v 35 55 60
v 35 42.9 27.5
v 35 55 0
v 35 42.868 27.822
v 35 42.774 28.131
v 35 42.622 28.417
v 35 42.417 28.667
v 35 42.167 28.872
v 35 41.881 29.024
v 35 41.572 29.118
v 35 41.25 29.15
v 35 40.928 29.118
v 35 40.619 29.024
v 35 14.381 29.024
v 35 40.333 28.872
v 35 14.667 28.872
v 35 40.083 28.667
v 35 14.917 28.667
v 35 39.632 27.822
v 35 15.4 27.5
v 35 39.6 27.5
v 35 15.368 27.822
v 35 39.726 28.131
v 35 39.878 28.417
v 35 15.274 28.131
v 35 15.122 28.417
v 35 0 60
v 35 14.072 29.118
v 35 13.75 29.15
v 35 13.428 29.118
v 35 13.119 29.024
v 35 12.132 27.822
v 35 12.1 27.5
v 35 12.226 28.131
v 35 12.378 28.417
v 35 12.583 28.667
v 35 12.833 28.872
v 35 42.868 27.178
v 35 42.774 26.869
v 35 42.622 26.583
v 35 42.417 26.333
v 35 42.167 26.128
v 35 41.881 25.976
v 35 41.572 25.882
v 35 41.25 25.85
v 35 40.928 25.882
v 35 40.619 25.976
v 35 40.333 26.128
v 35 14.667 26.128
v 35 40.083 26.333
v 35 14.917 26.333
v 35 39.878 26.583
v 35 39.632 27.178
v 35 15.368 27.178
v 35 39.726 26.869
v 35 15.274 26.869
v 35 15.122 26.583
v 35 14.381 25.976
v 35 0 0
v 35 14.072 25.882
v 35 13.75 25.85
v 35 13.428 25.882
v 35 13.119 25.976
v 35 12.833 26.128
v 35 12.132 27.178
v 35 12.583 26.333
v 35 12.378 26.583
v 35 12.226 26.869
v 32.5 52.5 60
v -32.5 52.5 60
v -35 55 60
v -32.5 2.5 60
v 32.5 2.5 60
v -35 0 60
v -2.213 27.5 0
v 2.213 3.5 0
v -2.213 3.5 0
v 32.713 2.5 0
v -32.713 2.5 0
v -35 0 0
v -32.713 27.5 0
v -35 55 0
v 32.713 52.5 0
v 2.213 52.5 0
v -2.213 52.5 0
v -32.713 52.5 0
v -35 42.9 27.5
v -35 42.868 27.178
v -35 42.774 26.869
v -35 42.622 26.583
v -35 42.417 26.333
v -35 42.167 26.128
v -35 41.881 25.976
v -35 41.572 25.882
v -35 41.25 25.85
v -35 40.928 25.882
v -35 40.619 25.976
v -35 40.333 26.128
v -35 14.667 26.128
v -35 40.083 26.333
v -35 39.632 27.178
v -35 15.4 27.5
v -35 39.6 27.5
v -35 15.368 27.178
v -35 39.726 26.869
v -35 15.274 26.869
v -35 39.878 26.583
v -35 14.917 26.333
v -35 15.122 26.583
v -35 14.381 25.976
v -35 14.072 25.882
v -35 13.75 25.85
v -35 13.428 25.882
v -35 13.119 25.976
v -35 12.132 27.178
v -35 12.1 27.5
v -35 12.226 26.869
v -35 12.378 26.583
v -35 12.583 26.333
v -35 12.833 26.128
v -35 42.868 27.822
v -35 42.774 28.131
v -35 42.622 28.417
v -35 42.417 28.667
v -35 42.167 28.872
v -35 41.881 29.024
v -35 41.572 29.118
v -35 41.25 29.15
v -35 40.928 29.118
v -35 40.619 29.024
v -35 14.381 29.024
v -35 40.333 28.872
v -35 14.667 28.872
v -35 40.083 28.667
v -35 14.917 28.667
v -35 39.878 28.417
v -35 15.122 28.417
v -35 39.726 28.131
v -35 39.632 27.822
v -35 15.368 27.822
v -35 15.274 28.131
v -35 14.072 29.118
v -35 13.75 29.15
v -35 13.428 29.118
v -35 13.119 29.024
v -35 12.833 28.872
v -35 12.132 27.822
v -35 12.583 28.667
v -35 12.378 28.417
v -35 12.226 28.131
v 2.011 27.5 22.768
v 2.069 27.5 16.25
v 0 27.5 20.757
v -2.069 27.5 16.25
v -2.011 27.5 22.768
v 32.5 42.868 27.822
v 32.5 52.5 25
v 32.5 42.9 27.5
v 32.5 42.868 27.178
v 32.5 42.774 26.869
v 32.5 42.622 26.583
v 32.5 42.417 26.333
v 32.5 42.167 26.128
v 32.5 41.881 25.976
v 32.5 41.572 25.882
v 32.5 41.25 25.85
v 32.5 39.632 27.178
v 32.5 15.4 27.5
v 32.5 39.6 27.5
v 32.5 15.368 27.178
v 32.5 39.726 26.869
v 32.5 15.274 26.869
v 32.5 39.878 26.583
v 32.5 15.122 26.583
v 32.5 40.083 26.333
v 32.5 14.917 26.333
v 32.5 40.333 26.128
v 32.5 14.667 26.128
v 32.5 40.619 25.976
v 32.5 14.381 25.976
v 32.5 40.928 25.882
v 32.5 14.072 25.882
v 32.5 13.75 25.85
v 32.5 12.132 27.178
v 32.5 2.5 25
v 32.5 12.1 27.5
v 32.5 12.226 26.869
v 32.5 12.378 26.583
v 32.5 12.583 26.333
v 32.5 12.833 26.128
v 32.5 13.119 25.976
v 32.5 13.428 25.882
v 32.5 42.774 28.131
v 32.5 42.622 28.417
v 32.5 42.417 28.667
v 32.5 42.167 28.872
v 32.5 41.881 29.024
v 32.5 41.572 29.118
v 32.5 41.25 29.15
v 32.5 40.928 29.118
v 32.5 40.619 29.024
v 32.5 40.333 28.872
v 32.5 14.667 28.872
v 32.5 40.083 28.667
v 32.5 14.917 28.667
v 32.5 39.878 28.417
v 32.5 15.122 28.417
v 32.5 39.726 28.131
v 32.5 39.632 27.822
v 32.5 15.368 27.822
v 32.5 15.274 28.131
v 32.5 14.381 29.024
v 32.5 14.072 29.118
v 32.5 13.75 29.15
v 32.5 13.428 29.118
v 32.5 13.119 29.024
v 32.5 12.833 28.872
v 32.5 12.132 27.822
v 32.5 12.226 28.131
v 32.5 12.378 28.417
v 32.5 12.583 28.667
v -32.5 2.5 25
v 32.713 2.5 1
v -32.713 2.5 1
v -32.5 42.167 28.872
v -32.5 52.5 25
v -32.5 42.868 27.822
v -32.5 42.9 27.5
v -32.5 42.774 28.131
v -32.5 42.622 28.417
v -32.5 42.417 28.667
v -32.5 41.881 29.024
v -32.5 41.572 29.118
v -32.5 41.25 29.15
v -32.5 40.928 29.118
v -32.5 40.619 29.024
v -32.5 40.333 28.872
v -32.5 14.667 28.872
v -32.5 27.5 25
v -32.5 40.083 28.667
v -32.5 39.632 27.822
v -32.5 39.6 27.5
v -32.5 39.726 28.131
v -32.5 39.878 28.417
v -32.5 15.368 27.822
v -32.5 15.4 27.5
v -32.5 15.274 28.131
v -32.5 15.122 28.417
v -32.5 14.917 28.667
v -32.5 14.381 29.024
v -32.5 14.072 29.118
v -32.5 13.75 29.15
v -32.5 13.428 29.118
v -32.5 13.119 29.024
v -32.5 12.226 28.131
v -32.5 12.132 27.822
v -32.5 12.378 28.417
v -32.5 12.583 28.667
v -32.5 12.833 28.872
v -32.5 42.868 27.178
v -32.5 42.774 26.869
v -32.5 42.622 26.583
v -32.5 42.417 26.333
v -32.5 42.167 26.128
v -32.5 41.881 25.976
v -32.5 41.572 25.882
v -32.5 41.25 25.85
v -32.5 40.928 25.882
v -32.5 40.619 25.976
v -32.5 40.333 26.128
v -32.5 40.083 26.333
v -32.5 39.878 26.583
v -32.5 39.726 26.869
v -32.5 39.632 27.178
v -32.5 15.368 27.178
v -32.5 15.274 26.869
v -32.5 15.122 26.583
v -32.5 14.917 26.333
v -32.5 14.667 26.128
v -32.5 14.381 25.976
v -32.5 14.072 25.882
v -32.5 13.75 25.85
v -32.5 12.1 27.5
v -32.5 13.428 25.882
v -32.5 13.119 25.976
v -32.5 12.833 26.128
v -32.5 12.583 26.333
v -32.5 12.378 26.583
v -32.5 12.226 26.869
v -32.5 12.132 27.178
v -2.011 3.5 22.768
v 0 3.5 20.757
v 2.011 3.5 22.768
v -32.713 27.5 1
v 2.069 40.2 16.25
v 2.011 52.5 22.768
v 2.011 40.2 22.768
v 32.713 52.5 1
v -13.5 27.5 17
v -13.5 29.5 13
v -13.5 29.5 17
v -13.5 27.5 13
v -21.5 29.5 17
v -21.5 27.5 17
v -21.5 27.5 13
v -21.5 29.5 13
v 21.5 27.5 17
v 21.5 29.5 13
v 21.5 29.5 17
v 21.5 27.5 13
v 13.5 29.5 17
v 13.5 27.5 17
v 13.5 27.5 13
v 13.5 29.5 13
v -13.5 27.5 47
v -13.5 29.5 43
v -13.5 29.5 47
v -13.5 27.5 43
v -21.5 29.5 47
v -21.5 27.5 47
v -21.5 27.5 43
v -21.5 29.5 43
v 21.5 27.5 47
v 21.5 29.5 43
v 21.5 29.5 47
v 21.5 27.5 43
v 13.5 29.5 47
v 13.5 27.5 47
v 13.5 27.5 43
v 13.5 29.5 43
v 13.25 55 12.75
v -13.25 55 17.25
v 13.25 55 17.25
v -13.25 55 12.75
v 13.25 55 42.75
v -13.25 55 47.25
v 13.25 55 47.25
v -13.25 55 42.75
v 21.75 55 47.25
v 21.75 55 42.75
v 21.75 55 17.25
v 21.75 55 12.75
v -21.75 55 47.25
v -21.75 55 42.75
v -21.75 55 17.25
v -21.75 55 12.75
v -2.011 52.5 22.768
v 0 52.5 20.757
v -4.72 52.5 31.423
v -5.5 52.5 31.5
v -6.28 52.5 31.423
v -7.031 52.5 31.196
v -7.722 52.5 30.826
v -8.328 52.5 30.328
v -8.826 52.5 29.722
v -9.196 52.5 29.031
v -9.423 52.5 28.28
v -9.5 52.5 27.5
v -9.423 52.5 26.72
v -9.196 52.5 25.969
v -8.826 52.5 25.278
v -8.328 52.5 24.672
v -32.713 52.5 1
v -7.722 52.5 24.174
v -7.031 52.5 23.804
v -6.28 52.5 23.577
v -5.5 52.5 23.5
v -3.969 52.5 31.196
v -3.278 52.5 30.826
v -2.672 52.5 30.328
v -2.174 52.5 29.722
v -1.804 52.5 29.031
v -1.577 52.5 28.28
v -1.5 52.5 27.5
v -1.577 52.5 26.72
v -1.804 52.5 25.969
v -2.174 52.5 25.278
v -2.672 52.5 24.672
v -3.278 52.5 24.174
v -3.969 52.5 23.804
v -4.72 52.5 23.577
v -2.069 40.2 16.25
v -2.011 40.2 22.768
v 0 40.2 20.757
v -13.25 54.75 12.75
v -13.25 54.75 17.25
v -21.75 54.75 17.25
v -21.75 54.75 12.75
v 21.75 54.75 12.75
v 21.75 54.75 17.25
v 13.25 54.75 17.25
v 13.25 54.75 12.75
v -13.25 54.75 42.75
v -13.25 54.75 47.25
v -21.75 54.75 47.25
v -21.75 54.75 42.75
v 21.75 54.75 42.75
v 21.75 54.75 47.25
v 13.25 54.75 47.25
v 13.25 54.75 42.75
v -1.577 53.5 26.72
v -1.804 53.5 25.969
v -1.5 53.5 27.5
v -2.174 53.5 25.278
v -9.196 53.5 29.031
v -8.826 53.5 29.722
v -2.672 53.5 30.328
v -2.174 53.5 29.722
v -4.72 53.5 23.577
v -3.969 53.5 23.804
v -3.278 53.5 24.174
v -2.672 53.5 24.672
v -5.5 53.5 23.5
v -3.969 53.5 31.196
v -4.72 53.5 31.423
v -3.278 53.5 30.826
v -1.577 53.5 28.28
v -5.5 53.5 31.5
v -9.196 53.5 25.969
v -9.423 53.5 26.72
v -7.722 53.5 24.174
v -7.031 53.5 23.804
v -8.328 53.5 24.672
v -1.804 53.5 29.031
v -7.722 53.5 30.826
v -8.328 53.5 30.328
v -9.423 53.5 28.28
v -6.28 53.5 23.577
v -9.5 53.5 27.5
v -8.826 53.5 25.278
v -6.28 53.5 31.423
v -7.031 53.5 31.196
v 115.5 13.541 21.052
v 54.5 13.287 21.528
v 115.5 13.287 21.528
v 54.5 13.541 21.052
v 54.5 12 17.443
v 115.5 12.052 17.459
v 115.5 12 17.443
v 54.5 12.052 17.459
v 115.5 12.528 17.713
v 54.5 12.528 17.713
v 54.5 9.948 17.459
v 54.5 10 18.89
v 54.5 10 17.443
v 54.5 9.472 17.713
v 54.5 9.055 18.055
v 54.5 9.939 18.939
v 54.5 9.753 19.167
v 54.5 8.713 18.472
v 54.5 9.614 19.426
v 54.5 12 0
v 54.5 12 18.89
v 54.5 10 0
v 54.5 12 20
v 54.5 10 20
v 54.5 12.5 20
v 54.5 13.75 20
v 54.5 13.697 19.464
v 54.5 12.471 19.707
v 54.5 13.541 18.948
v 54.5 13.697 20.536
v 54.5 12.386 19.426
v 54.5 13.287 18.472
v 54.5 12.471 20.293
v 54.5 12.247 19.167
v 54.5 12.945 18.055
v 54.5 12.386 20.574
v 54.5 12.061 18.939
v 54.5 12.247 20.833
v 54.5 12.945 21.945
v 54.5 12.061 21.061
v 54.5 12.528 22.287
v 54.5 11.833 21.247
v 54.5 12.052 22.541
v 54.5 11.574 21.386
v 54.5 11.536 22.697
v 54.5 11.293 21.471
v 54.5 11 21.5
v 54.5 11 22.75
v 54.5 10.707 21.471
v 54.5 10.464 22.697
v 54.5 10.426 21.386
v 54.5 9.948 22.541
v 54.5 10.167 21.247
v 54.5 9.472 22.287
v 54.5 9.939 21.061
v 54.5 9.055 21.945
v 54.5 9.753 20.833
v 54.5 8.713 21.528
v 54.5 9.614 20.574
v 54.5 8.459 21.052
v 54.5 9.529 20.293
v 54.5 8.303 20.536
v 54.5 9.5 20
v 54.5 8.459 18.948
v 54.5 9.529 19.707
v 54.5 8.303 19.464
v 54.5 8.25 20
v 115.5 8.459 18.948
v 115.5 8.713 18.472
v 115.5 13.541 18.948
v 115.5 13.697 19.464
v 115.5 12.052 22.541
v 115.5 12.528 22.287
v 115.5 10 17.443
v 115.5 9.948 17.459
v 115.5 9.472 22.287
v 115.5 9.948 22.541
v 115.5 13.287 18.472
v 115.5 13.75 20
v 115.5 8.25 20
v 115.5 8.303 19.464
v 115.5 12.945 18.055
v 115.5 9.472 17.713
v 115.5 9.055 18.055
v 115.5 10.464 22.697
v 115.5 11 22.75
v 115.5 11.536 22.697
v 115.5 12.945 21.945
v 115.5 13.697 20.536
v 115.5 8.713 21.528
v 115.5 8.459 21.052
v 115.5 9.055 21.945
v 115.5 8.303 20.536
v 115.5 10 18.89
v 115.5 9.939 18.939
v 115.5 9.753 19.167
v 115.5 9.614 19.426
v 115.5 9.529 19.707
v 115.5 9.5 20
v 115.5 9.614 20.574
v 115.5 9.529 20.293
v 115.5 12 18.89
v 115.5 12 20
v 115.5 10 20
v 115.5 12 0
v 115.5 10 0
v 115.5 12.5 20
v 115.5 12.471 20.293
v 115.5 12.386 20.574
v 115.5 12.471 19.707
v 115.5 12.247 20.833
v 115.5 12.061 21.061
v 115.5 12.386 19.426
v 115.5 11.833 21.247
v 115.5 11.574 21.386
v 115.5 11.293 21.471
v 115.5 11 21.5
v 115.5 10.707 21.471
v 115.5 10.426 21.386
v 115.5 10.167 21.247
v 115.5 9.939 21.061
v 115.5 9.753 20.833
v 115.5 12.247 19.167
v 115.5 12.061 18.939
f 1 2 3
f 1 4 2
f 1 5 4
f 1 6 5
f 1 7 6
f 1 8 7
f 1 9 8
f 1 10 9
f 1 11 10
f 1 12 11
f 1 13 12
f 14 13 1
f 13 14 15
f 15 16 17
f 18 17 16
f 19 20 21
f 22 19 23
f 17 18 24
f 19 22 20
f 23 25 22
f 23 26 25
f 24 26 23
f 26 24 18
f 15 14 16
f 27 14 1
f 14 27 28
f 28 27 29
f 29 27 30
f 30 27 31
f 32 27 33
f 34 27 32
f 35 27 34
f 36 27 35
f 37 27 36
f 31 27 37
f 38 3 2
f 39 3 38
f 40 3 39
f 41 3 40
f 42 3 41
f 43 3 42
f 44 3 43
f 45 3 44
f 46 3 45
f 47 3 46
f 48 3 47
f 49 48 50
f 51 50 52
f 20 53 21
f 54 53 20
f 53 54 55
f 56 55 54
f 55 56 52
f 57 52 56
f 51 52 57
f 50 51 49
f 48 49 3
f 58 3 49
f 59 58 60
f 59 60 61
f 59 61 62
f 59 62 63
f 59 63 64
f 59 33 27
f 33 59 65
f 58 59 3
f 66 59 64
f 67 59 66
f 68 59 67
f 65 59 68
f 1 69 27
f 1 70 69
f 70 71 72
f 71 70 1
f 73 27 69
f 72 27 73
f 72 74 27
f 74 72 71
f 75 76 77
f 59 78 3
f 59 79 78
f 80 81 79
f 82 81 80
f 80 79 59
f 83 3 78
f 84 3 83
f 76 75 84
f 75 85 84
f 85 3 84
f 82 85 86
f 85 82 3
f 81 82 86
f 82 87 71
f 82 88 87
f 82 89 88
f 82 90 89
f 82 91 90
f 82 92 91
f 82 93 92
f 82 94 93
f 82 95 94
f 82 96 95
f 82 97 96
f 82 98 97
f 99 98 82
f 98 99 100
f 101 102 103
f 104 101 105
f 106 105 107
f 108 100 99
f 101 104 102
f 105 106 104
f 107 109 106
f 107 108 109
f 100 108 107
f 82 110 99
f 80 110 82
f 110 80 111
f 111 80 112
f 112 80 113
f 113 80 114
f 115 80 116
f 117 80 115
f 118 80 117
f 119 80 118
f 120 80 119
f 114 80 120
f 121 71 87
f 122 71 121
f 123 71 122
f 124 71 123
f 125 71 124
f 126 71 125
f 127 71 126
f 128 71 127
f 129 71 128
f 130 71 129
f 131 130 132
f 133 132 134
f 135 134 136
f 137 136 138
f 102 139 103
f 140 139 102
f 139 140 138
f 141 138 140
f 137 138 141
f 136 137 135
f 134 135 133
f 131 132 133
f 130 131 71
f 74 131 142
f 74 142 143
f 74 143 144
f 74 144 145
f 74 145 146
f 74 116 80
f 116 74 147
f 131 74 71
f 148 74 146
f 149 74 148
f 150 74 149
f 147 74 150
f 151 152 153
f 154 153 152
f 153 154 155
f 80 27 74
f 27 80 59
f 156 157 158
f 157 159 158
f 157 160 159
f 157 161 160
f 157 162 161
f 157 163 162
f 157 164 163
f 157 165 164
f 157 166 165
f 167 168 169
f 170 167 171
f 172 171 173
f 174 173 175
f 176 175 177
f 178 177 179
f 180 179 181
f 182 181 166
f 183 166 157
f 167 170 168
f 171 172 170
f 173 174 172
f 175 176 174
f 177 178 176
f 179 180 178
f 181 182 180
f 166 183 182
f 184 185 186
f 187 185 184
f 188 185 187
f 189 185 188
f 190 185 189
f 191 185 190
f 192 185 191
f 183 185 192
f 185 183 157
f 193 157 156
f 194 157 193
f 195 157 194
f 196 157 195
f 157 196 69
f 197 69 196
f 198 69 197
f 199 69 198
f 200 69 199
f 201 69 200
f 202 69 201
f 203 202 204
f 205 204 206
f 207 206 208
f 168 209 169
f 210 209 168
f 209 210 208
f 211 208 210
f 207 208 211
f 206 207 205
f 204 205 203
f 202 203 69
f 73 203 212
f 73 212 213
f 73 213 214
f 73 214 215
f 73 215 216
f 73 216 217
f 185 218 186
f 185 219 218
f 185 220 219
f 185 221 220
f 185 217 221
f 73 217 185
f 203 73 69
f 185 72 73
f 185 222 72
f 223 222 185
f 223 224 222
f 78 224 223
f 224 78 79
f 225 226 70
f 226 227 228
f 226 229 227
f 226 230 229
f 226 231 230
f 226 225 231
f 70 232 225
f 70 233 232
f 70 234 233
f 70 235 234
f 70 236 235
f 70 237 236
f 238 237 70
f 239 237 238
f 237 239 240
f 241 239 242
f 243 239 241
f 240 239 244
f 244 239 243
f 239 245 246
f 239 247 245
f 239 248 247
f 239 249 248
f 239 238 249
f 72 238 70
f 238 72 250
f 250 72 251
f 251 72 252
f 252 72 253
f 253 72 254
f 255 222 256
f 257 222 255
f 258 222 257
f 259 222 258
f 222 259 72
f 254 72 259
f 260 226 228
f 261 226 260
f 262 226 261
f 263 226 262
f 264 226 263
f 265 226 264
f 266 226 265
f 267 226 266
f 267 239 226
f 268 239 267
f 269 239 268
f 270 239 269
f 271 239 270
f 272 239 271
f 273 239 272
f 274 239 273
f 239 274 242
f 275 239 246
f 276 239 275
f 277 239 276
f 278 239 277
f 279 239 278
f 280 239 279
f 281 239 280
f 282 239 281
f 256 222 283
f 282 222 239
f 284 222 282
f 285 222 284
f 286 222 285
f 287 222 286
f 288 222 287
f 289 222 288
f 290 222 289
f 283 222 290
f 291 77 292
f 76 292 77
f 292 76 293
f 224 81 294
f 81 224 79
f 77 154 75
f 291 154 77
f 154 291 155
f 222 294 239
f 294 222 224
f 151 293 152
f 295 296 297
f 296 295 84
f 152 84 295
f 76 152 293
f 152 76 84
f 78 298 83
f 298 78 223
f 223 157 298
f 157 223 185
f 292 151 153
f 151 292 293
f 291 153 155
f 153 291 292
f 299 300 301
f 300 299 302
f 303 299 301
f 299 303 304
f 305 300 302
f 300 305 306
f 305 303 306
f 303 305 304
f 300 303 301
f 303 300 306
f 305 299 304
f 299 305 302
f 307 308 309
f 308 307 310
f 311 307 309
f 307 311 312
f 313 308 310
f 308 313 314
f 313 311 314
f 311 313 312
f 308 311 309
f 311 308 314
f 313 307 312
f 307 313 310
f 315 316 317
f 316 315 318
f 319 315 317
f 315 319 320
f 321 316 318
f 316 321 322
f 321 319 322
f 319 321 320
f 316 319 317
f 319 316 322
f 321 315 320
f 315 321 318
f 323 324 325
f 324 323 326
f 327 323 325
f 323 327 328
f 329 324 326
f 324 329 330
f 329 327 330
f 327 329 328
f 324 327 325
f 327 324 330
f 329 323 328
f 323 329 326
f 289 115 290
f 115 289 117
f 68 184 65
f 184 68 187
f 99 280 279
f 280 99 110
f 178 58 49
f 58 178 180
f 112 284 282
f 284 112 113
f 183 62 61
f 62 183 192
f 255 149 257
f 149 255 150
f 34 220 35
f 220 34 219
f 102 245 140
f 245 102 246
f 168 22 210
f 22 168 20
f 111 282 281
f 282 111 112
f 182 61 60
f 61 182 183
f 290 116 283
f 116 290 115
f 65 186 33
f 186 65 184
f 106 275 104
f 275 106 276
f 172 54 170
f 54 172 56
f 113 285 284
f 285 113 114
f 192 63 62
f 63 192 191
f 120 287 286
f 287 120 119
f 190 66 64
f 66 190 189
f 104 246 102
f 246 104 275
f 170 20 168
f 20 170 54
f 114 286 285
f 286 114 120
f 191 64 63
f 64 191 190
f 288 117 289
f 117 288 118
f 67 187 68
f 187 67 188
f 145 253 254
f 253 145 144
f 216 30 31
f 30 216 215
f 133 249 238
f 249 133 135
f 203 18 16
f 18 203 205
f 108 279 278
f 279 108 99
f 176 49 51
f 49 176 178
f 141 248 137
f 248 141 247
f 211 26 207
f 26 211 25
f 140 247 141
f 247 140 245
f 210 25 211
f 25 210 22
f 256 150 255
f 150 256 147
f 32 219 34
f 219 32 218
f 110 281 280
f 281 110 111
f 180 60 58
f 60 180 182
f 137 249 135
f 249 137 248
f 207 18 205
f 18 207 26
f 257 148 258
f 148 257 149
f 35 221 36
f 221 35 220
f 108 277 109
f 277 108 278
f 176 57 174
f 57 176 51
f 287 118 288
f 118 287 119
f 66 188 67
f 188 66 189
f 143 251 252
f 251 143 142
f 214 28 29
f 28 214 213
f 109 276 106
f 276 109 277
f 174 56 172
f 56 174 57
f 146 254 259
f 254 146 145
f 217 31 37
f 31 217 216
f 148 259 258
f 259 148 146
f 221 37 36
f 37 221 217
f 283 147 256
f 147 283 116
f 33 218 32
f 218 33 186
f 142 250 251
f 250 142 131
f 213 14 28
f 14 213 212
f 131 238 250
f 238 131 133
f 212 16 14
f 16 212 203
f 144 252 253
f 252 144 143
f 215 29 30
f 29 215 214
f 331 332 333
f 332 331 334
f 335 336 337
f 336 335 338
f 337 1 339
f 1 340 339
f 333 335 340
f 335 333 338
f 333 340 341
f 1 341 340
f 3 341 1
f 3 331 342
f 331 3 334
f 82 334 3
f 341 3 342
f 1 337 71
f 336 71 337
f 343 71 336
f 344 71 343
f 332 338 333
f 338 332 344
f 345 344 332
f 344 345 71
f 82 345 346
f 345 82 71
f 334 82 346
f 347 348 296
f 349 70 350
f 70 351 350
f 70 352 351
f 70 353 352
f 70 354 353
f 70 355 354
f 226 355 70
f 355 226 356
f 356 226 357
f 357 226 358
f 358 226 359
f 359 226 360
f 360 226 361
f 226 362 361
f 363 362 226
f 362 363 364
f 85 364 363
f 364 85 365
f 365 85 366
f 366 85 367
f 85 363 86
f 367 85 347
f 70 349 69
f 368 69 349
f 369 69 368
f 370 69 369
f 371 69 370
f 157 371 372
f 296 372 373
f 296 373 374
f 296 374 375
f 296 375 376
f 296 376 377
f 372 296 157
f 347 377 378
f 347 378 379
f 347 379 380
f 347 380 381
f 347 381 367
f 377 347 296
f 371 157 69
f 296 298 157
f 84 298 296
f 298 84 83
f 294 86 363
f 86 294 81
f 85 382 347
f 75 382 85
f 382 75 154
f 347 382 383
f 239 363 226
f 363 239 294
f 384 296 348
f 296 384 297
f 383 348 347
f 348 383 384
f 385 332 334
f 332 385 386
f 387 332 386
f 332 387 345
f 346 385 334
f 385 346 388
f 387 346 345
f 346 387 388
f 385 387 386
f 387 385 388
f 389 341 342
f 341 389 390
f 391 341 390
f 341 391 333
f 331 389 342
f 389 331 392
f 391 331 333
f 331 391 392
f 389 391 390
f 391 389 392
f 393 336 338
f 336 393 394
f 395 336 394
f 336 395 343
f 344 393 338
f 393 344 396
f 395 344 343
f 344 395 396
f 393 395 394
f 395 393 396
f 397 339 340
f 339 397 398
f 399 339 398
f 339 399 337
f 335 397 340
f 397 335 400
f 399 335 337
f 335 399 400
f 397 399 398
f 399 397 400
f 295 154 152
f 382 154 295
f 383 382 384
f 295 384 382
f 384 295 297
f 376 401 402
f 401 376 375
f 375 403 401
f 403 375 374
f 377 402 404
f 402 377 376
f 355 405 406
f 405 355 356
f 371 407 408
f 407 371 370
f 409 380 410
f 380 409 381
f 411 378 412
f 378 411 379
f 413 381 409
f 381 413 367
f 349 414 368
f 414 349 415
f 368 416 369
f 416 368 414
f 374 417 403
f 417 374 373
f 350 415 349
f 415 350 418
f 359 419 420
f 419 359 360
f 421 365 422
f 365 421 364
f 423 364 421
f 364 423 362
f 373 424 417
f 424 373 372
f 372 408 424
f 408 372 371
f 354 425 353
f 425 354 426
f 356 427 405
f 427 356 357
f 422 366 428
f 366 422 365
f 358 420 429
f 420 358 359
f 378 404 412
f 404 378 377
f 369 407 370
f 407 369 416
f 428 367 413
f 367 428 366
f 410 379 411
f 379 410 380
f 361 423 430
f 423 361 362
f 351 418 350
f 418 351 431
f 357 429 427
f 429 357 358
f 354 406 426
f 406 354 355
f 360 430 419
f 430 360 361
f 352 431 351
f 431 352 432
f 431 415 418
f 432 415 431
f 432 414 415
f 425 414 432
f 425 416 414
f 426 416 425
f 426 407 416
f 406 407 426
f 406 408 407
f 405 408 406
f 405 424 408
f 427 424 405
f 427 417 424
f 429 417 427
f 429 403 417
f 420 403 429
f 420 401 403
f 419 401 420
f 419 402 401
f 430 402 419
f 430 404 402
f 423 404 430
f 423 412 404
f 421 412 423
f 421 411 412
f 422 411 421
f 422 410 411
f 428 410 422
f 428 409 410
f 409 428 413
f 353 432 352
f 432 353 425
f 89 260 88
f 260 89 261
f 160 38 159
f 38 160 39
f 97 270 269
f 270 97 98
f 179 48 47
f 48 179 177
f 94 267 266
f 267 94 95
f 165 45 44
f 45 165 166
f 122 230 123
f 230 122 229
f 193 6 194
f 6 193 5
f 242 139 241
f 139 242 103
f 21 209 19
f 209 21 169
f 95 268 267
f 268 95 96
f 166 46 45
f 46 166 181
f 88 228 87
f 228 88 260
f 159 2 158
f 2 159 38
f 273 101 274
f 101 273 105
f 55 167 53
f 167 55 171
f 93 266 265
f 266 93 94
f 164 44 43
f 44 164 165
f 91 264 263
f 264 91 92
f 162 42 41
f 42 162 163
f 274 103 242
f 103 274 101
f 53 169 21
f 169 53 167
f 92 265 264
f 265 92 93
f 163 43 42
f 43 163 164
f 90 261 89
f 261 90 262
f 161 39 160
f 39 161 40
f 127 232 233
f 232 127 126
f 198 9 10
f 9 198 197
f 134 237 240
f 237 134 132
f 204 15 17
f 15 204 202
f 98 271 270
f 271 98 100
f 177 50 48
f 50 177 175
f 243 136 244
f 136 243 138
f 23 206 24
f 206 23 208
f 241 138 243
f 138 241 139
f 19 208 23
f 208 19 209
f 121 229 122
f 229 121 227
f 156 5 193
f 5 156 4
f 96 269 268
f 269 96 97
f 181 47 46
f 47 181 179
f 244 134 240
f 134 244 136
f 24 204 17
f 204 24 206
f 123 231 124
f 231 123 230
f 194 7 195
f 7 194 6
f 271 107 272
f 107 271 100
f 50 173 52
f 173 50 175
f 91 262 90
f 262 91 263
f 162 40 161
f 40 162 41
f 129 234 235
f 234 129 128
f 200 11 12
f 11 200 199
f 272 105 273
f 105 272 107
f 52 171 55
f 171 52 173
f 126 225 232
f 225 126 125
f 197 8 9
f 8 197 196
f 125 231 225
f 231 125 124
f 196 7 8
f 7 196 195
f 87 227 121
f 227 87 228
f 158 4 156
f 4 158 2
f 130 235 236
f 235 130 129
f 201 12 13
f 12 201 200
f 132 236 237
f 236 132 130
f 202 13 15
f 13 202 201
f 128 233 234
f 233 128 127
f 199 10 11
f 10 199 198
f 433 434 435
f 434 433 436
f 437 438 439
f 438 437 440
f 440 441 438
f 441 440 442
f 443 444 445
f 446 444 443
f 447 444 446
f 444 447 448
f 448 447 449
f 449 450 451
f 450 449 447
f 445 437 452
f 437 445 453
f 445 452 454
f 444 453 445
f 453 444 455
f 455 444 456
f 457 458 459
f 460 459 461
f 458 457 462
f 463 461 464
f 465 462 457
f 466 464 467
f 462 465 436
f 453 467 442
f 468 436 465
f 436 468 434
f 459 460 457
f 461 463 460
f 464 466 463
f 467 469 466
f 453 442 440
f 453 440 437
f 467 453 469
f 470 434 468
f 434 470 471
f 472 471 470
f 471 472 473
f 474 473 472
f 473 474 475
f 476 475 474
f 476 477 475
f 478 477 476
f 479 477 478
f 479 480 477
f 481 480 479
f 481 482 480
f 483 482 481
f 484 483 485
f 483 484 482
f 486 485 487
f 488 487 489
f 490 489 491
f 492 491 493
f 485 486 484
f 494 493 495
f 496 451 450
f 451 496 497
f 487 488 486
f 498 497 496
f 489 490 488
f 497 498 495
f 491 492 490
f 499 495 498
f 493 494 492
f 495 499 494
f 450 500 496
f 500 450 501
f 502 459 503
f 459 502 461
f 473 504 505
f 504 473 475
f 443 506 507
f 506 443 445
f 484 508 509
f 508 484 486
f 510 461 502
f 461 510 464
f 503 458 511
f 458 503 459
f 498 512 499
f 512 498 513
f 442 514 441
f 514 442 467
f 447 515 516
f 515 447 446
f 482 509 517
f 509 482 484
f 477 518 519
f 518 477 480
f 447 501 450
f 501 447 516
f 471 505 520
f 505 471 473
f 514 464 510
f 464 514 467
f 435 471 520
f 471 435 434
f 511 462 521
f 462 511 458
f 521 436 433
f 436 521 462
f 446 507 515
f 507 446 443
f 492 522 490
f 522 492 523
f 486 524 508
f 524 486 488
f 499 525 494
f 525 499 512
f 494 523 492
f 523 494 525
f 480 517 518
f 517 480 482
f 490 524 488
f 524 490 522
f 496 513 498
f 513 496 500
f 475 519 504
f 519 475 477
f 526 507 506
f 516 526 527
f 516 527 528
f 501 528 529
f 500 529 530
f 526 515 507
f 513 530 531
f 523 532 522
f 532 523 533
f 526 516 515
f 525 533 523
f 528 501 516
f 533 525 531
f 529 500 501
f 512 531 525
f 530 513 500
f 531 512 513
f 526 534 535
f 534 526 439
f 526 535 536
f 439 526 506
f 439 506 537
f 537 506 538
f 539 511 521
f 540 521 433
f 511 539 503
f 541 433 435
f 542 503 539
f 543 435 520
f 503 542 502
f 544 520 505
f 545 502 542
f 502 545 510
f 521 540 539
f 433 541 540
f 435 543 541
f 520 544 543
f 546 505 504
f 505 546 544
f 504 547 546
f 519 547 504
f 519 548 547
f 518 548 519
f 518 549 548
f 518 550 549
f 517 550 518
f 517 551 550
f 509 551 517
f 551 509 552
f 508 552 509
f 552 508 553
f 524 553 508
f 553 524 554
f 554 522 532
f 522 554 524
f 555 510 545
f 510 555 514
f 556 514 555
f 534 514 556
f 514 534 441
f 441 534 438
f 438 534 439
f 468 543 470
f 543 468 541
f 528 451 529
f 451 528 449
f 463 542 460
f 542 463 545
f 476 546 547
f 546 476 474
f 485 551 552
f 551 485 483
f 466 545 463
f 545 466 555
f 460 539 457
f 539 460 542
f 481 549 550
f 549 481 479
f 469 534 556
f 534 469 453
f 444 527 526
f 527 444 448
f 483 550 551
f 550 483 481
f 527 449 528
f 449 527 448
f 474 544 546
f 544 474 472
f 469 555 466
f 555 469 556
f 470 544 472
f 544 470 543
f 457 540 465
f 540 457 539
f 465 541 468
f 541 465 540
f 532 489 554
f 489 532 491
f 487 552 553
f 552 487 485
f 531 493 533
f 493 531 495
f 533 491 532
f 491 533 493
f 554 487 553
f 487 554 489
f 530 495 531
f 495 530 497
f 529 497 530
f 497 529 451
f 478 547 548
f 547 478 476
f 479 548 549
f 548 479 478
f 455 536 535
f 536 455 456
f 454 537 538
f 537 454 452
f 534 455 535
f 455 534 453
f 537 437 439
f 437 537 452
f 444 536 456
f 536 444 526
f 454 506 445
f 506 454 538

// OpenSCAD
// ============================================================
// LEGO AI Sorting Machine — Y-Junction Gate Module (Print-Optimized)
// Parametric OpenSCAD Model v2
// ============================================================
//
// PRINT OPTIMIZATION STRATEGY:
//
// The original single-piece Y-junction had major overhang 
// problems (angled chute ceilings, servo pocket, internal
// surfaces needing supports that are impossible to remove).
//
// NEW DESIGN: Split vertically into FRONT and BACK half-shells.
//
// Each half is a trough/channel shape that prints FLAT on the
// bed (open side up). The internal chute surfaces are the 
// smooth top layer — perfect sliding surface, zero supports.
//
// The two halves clip together with snap tabs along the edges.
// The servo mounts in a pocket formed by both halves meeting.
//
// Additionally, all angled chute transitions use 45° chamfers
// instead of sharp 90° overhangs.
//
// PRINT SETTINGS:
//   Material: PETG (smooth chute surface + durability)
//   Layer height: 0.2mm
//   Infill: 25%
//   Supports: NONE NEEDED
//   Walls: 3 perimeters
//   Print: flat, open-side-up
//   Time: ~25 min per half, ~50 min per complete module
//   Total for 31 modules: ~26 hours
//
// All dimensions in mm.
// ============================================================

// ── PARAMETERS ─────────────────────────────────────────────

// Chute dimensions (interior)
chute_width    = 65;    // fits long plates (~64mm on short axis)
chute_depth    = 50;    // Technic beams can tumble through
wall           = 2.5;

// Module overall
module_width  = chute_width + 2 * wall;   // ~70mm
module_depth  = chute_depth + 2 * wall;   // ~55mm
module_height = 60;

// Y-split geometry
split_angle   = 28;     // angle of each output branch
split_start_z = 25;     // Z height where Y-split begins

// Flap pivot
pivot_dia     = 3;
pivot_z       = split_start_z;

// Servo (SG90)
servo_body_w  = 23.5;
servo_body_d  = 12.7;
servo_body_h  = 22.5;
servo_shaft_offset = 5.5;

// Snap tabs for joining halves
snap_tab_w    = 8;
snap_tab_h    = 4;
snap_tab_d    = 2;
snap_tol      = 0.25;

// Chamfer angle for overhang-free transitions
chamfer = 45;  // degrees — FDM printers handle 45° without supports

// ── HELPER: Chamfered transition ───────────────────────────
// Replaces sharp 90° internal corners with 45° slopes

module chamfer_strip(length, size) {
    // A 45-degree chamfer strip to fill internal corners
    rotate([0, 90, 0])
        linear_extrude(height = length, center = true)
            polygon([[0, 0], [size, 0], [0, size]]);
}

// ── HALF-SHELL CHUTE PROFILE ───────────────────────────────
// 2D cross-section of one half of the Y-junction.
// This gets extruded to half the module depth.

module chute_half_profile() {
    // The profile is the interior chute shape as seen from the side.
    // Input chute (top) narrows to a Y-split, with two output channels.
    
    half_w = chute_width / 2;
    offset = split_start_z * tan(split_angle * PI / 180);
    
    // Left output channel bottom-left corner
    lx1 = -half_w - offset;
    // Right output channel bottom-right corner  
    rx1 = half_w + offset;
    
    polygon([
        // Top input (straight chute)
        [-half_w, module_height],
        [half_w, module_height],
        // Narrow to split point
        [half_w, split_start_z],
        // Right output angle
        [rx1, 0],
        [rx1 - half_w, 0],
        // Center divider (V-shape)
        [0, split_start_z - 3],
        [-half_w + offset, 0],  
        [lx1, 0],
        // Left output angle
        [-half_w, split_start_z],
    ]);
}

// ── FRONT HALF ─────────────────────────────────────────────
// Prints flat on bed, open (interior) side up.
// The chute surfaces are the smooth top surface = great for 
// bricks sliding through.

module front_half() {
    half_depth = module_depth / 2;
    
    difference() {
        union() {
            // Outer shell — half the depth
            difference() {
                // Solid outer block
                translate([-module_width/2, 0, 0])
                    cube([module_width, half_depth, module_height]);
                
                // Interior chute carved out 
                // (slightly less than half_depth so we have a floor)
                translate([0, wall, 0])
                    linear_extrude(height = module_height + 1)
                        offset(r = 0)
                            scale([1, 1])
                                translate([-chute_width/2, 0])
                                    square([chute_width, 1]);
                
                // Main input channel
                translate([-chute_width/2, wall, split_start_z])
                    cube([chute_width, half_depth, module_height - split_start_z + 1]);
                
                // Left output channel (angled)
                left_offset = split_start_z * tan(split_angle * PI / 180);
                hull() {
                    translate([-chute_width/2, wall, split_start_z - 1])
                        cube([chute_width/2 - 2, half_depth - wall, 1]);
                    translate([-chute_width/2 - left_offset, wall, 0])
                        cube([chute_width/2 - 2, half_depth - wall, 1]);
                }
                
                // Right output channel (angled)
                hull() {
                    translate([2, wall, split_start_z - 1])
                        cube([chute_width/2 - 2, half_depth - wall, 1]);
                    translate([2 + left_offset, wall, 0])
                        cube([chute_width/2 - 2, half_depth - wall, 1]);
                }
                
                // 45° chamfers at the split junction (no sharp overhangs)
                // These replace the sharp top edge of the V-divider
                translate([0, wall, split_start_z])
                    rotate([0, 45, 0])
                        translate([-3, 0, -3])
                            cube([6, half_depth - wall, 6]);
            }
            
            // Snap tabs on the flat mating face (at y = half_depth)
            for (z_pos = [15, module_height - 15]) {
                for (x_pos = [-module_width/4, module_width/4]) {
                    translate([x_pos - snap_tab_w/2, half_depth, z_pos - snap_tab_h/2])
                        cube([snap_tab_w, snap_tab_d, snap_tab_h]);
                }
            }
        }
        
        // Pivot pin hole (runs through front half)
        translate([-module_width/2 - 1, half_depth / 2, pivot_z + wall])
            rotate([0, 90, 0])
                cylinder(h = module_width + 2, d = pivot_dia + 0.3, $fn = 32);
    }
}

// ── BACK HALF ──────────────────────────────────────────────
// Mirror of front half, but includes the servo pocket.
// Also prints flat, open side up.

module back_half() {
    half_depth = module_depth / 2;
    
    difference() {
        union() {
            // Outer shell — mirror of front half
            translate([-module_width/2, 0, 0])
            difference() {
                cube([module_width, half_depth, module_height]);
                
                // Main input channel
                translate([wall, wall, split_start_z])
                    cube([chute_width, half_depth, module_height - split_start_z + 1]);
                
                // Left output channel
                left_offset = split_start_z * tan(split_angle * PI / 180);
                hull() {
                    translate([wall, wall, split_start_z - 1])
                        cube([chute_width/2 - 2, half_depth - wall, 1]);
                    translate([wall - left_offset, wall, 0])
                        cube([chute_width/2 - 2, half_depth - wall, 1]);
                }
                
                // Right output channel
                hull() {
                    translate([wall + chute_width/2 + 2, wall, split_start_z - 1])
                        cube([chute_width/2 - 2, half_depth - wall, 1]);
                    translate([wall + chute_width/2 + 2 + left_offset, wall, 0])
                        cube([chute_width/2 - 2, half_depth - wall, 1]);
                }
                
                // 45° chamfer at split
                translate([module_width/2, wall, split_start_z])
                    rotate([0, 45, 0])
                        translate([-3, 0, -3])
                            cube([6, half_depth - wall, 6]);
            }
        }
        
        // Snap tab receiving slots on mating face (at y = 0)
        for (z_pos = [15, module_height - 15]) {
            for (x_pos = [-module_width/4, module_width/4]) {
                translate([x_pos - snap_tab_w/2 - snap_tol, -snap_tab_d - snap_tol, 
                           z_pos - snap_tab_h/2 - snap_tol])
                    cube([snap_tab_w + 2*snap_tol, snap_tab_d + 2*snap_tol, snap_tab_h + 2*snap_tol]);
            }
        }
        
        // Servo pocket (cut into rear exterior)
        // When printed open-side-up, this pocket faces sideways = no supports
        translate([-servo_body_w/2, half_depth - servo_body_d, pivot_z + wall - servo_body_h/2])
            cube([servo_body_w, servo_body_d + 1, servo_body_h]);
        
        // Servo shaft hole through to interior
        translate([-servo_shaft_offset, wall - 1, pivot_z + wall])
            rotate([-90, 0, 0])
                cylinder(h = wall + 2, d = 8, $fn = 32);
        
        // Pivot pin hole
        translate([-module_width/2 - 1, half_depth / 2, pivot_z + wall])
            rotate([0, 90, 0])
                cylinder(h = module_width + 2, d = pivot_dia + 0.3, $fn = 32);
    }
}

// ── GATE FLAP ──────────────────────────────────────────────
// Prints flat on bed. Simple flat piece + pivot barrel.
// The barrel prints as a horizontal cylinder — use a brim
// for bed adhesion. Alternatively, print with the flat blade
// on the bed and the barrel on top (barrel is only 6mm 
// diameter, bridges fine).

module gate_flap() {
    flap_width  = chute_width - 4;
    flap_height = split_start_z - 5;
    barrel_dia  = pivot_dia + 2.5;
    
    // Flat blade
    translate([-flap_width/2, 0, 0])
        cube([flap_width, 2, flap_height]);
    
    // Pivot barrel at top
    // Has a flat on the bottom so it sits on the bed nicely
    translate([0, 1, flap_height])
        difference() {
            // Barrel
            rotate([0, 90, 0])
                cylinder(h = flap_width, d = barrel_dia, $fn = 32, center = true);
            // Pivot hole
            rotate([0, 90, 0])
                cylinder(h = flap_width + 2, d = pivot_dia, $fn = 32, center = true);
            // Flat bottom for printing (cut bottom of barrel)
            translate([-flap_width/2 - 1, -barrel_dia/2 - 1, -barrel_dia])
                cube([flap_width + 2, barrel_dia + 2, barrel_dia/2]);
        }
}

// ── STACKING CONNECTORS ────────────────────────────────────
// Tabs on top and slots on bottom for stacking modules in the tree.
// These are part of the front/back halves but shown here for clarity.

module stack_tab_top() {
    // Raised bumps on top face for aligning the module above
    for (x_pos = [-module_width/4, module_width/4]) {
        translate([x_pos, module_depth/4, module_height])
            cylinder(h = 3, d = 6, $fn = 6);  // hex peg
    }
}

module stack_slot_bottom() {
    // Matching hex slots on bottom face
    for (x_pos = [-module_width/4, module_width/4]) {
        translate([x_pos, module_depth/4, -1])
            cylinder(h = 4, d = 6.5, $fn = 6);  // hex hole with tolerance
    }
}

// ── RENDER ──────────────────────────────────────────────────

// Option 1: Assembled module (both halves together)
front_half();
translate([0, module_depth/2, 0]) 
    mirror([0, 1, 0]) 
        translate([0, -module_depth/2, 0])
            back_half();

// Gate flap shown beside
translate([module_width + 15, 10, 0]) gate_flap();

// Option 2: Print layout (both halves flat, open side up)
// front_half();
// translate([module_width + 10, 0, 0]) back_half();
// translate([0, module_depth + 10, 0]) gate_flap();

// ============================================================
// PRINT INSTRUCTIONS:
//
// Front Half:
//   Orientation: Open (interior) side UP
//   Supports: NONE — all chute surfaces are top layers = smooth
//   Time: ~25 min
//   Print 31 copies
//
// Back Half:
//   Orientation: Open (interior) side UP  
//   Supports: NONE — servo pocket opens to the side/top
//   Time: ~25 min
//   Print 31 copies
//
// Gate Flap:
//   Orientation: Flat blade on bed, barrel on top
//   Supports: NONE — barrel flat is trimmed for bed contact
//   Time: ~8 min
//   Print 31 copies
//
// ASSEMBLY (per module):
//   1. Snap front half + back half together (tabs click in)
//   2. Optional: add a drop of CA glue on the seam
//   3. Insert gate flap, thread 3mm pin through pivot holes
//   4. Push SG90 servo into rear pocket
//   5. Connect servo horn to flap with short linkage wire
//   6. Stack modules into tree using hex alignment pegs
//
// TOTAL: 31 × (front + back + flap) = 93 prints
// TOTAL TIME: ~30 hours (batch printing recommended)
// ============================================================
